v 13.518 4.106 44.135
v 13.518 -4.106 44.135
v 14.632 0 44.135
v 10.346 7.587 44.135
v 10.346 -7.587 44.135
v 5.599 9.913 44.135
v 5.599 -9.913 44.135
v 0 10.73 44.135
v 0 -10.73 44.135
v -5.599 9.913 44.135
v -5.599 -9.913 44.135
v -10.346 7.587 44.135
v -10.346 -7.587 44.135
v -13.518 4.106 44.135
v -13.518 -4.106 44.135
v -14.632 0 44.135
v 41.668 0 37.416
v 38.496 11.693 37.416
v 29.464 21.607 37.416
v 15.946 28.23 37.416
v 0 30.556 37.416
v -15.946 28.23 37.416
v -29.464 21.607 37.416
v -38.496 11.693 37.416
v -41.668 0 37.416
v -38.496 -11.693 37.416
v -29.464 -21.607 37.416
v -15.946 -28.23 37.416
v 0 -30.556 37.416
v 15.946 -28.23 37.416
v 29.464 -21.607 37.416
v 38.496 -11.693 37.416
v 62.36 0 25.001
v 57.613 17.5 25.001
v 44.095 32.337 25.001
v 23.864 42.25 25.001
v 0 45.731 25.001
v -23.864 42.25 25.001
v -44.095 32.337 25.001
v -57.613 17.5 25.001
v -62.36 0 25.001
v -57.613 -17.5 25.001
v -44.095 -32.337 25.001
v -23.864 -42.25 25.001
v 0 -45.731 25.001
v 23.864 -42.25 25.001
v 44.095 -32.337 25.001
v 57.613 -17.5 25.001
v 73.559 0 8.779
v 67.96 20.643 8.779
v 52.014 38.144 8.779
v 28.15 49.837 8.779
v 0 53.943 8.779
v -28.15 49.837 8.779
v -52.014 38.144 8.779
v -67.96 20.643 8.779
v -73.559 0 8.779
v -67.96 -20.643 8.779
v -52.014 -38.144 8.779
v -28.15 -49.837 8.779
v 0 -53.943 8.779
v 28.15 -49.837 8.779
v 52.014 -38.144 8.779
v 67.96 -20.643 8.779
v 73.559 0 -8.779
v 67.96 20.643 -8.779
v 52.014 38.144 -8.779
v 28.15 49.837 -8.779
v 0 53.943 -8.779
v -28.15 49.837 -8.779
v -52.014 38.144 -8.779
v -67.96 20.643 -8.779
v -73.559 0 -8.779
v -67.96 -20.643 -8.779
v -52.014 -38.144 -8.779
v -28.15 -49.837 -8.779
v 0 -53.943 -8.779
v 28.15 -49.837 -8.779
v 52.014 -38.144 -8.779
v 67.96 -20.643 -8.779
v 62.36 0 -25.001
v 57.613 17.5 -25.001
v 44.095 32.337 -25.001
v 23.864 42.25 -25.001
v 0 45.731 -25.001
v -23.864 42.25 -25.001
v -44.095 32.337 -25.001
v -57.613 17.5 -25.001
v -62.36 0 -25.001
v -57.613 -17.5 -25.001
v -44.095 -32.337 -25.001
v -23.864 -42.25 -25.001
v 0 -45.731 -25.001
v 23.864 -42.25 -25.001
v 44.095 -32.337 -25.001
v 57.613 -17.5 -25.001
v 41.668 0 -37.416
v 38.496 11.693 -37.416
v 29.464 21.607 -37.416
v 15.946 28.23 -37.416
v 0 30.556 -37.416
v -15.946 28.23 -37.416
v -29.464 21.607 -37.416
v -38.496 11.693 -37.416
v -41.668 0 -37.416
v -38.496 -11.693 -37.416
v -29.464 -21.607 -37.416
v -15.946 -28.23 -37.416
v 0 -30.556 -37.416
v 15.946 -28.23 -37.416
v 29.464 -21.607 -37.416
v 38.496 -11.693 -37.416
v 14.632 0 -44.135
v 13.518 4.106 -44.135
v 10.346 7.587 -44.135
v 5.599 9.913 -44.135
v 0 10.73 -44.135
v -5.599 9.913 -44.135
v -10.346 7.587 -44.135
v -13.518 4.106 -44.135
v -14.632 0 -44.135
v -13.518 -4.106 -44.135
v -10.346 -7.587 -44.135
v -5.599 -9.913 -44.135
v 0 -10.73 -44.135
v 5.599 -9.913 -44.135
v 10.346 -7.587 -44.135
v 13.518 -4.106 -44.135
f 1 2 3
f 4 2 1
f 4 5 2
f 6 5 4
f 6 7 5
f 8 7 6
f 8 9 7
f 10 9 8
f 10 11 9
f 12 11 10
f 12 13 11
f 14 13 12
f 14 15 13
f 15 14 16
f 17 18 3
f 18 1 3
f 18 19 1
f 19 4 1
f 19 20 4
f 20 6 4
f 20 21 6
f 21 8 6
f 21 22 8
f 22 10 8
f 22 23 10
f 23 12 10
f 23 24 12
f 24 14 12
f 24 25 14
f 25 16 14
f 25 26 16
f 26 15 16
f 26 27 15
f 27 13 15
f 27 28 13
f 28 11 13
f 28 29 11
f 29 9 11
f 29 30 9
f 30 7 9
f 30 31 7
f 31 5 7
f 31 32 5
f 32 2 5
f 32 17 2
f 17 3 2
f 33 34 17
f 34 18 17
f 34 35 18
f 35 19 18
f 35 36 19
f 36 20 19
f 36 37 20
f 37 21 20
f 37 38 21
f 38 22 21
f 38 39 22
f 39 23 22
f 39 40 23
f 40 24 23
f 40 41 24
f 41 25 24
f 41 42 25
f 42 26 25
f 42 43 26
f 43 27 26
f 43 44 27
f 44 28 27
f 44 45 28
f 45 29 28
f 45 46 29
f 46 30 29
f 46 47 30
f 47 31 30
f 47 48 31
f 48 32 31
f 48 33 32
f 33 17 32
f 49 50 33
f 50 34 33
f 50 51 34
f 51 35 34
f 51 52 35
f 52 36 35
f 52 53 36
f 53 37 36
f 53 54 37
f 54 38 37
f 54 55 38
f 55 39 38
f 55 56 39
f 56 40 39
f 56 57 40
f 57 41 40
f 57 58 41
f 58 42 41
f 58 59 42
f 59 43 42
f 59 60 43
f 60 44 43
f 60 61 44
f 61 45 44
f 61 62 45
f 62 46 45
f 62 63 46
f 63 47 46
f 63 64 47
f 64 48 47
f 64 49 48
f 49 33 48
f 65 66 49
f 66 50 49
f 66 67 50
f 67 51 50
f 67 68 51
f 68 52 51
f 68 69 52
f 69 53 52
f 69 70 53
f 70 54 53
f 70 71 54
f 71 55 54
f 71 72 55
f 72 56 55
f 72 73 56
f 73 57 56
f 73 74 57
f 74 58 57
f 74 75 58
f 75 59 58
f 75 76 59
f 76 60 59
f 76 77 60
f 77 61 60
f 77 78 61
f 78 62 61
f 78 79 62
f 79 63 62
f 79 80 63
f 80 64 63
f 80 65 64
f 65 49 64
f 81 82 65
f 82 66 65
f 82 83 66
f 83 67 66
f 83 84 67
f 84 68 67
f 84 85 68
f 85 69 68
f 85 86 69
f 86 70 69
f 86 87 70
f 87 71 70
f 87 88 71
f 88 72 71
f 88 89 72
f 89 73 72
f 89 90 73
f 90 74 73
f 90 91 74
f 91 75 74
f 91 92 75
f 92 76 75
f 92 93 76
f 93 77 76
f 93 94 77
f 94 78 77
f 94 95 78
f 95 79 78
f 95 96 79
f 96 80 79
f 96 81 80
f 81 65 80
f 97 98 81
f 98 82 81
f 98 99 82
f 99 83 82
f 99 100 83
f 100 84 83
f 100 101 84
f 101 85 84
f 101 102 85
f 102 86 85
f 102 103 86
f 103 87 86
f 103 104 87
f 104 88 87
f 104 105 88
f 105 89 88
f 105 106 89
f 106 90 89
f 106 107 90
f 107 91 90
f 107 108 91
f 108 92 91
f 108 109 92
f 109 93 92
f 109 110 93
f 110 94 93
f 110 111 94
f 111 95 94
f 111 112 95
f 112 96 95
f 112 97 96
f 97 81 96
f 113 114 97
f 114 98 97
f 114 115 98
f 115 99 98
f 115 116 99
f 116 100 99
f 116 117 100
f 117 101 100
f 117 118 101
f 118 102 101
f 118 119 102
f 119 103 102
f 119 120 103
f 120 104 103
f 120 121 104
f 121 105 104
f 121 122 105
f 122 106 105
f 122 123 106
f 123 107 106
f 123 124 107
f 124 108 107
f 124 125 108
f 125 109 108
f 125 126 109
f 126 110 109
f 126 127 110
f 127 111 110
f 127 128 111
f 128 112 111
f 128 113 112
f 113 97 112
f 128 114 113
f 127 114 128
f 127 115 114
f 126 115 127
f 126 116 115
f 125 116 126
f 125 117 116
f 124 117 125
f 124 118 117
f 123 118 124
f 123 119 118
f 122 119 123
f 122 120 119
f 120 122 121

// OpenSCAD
// Generated by SolidPython 1.0.1 on 2020-07-29 00:46:52


scale(v = [15, 11, 9]) {
	sphere(r = 5);
}
/***********************************************
*********      SolidPython code:      **********
************************************************
 
# import packages: SolidPython
from solid import *
from solid.utils import *
from itertools import chain, combinations, permutations


class Resize:

    def __init__(self, scad_file):
        self.scad_file = scad_file
        #self.scad_file = import_scad(scad_file)
        # cone/cylinder param:
        self.r1 = 0
        self.r2 = 0
        self.h = 0
        # rectangular prism param:
        self.w = 0
        self.l = 0
        # ellipse param:
        self.r = 0

    # import OpenScad code (file name corresponds to shape)


    # classify shape + parameters
    def assign(self, param1, param2, param3):
        if self.scad_file == 'cone.scad':
            self.r1 = param1
            self.r2 = param2
            self.h = param3
        elif self.scad_file == 'cylinder.scad':
            self.r1 = param1
            self.r2 = param2
            self.h = param3
        elif self.scad_file == 'rectangularPrism.scad':
            self.h = param1
            self.l = param2
            self.w = param3
        else:
            self.r = param1
            self.h = param2

    # resize parameters
    def iterate(self):
        x = range(3, 20, 2)
        i = 1
        if self.scad_file == 'cone.scad':
            tempList = list(permutations(x, 2))
            for temp in tempList:
                param1 = temp[0]
                param2 = temp[1]
                filepath = 'produced_scad_files/' + 'cone' + str(param1) + '_' + str(param2) + '_' + '.scad'
                scad_render_to_file(cylinder(h=param1, r1=param2, r2=0), filepath)

        elif self.scad_file == 'cylinder.scad':
            tempList = list(permutations(x, 3))
            for temp in tempList:
                param1 = temp[0]
                param2 = temp[1]
                filepath = 'produced_scad_files/' + 'cylinder' + str(param1) + '_' + str(param2) + '_' + '.scad'
                scad_render_to_file(cylinder(h=param1, r1=param2, r2=param2), filepath)

        elif self.scad_file == 'rectangularPrism.scad':
            tempList = list(permutations(x, 3))
            for temp in tempList:
                param1 = temp[0]
                param2 = temp[1]
                param3 = temp[2]
                filepath = 'produced_scad_files/' + 'rectangularPrism' + str(param1) + '_' + str(param2) + '_' + str(
                    param3) + '.scad'
                scad_render_to_file(cube(size=(param1, param2, param3)), filepath)

        elif self.scad_file == 'ellipse.scad':
            tempList = list(permutations(x, 4))
            for temp in tempList:
                param1 = temp[0]
                param2 = temp[1]
                param3 = temp[2]
                param4 = temp[3]
                filepath = 'produced_scad_files/' + 'ellipse' + str(param1) + '_' + str(param2) + '_' + str(param3) + '_' + str(param4) + '.scad'
                scad_render_to_file(scale([param1, param2, param3])(sphere(r=param4)), filepath)

    def render_to_scadfile(self):
        scad_render_to_file(scad, 'example.scad') 
 
************************************************/
